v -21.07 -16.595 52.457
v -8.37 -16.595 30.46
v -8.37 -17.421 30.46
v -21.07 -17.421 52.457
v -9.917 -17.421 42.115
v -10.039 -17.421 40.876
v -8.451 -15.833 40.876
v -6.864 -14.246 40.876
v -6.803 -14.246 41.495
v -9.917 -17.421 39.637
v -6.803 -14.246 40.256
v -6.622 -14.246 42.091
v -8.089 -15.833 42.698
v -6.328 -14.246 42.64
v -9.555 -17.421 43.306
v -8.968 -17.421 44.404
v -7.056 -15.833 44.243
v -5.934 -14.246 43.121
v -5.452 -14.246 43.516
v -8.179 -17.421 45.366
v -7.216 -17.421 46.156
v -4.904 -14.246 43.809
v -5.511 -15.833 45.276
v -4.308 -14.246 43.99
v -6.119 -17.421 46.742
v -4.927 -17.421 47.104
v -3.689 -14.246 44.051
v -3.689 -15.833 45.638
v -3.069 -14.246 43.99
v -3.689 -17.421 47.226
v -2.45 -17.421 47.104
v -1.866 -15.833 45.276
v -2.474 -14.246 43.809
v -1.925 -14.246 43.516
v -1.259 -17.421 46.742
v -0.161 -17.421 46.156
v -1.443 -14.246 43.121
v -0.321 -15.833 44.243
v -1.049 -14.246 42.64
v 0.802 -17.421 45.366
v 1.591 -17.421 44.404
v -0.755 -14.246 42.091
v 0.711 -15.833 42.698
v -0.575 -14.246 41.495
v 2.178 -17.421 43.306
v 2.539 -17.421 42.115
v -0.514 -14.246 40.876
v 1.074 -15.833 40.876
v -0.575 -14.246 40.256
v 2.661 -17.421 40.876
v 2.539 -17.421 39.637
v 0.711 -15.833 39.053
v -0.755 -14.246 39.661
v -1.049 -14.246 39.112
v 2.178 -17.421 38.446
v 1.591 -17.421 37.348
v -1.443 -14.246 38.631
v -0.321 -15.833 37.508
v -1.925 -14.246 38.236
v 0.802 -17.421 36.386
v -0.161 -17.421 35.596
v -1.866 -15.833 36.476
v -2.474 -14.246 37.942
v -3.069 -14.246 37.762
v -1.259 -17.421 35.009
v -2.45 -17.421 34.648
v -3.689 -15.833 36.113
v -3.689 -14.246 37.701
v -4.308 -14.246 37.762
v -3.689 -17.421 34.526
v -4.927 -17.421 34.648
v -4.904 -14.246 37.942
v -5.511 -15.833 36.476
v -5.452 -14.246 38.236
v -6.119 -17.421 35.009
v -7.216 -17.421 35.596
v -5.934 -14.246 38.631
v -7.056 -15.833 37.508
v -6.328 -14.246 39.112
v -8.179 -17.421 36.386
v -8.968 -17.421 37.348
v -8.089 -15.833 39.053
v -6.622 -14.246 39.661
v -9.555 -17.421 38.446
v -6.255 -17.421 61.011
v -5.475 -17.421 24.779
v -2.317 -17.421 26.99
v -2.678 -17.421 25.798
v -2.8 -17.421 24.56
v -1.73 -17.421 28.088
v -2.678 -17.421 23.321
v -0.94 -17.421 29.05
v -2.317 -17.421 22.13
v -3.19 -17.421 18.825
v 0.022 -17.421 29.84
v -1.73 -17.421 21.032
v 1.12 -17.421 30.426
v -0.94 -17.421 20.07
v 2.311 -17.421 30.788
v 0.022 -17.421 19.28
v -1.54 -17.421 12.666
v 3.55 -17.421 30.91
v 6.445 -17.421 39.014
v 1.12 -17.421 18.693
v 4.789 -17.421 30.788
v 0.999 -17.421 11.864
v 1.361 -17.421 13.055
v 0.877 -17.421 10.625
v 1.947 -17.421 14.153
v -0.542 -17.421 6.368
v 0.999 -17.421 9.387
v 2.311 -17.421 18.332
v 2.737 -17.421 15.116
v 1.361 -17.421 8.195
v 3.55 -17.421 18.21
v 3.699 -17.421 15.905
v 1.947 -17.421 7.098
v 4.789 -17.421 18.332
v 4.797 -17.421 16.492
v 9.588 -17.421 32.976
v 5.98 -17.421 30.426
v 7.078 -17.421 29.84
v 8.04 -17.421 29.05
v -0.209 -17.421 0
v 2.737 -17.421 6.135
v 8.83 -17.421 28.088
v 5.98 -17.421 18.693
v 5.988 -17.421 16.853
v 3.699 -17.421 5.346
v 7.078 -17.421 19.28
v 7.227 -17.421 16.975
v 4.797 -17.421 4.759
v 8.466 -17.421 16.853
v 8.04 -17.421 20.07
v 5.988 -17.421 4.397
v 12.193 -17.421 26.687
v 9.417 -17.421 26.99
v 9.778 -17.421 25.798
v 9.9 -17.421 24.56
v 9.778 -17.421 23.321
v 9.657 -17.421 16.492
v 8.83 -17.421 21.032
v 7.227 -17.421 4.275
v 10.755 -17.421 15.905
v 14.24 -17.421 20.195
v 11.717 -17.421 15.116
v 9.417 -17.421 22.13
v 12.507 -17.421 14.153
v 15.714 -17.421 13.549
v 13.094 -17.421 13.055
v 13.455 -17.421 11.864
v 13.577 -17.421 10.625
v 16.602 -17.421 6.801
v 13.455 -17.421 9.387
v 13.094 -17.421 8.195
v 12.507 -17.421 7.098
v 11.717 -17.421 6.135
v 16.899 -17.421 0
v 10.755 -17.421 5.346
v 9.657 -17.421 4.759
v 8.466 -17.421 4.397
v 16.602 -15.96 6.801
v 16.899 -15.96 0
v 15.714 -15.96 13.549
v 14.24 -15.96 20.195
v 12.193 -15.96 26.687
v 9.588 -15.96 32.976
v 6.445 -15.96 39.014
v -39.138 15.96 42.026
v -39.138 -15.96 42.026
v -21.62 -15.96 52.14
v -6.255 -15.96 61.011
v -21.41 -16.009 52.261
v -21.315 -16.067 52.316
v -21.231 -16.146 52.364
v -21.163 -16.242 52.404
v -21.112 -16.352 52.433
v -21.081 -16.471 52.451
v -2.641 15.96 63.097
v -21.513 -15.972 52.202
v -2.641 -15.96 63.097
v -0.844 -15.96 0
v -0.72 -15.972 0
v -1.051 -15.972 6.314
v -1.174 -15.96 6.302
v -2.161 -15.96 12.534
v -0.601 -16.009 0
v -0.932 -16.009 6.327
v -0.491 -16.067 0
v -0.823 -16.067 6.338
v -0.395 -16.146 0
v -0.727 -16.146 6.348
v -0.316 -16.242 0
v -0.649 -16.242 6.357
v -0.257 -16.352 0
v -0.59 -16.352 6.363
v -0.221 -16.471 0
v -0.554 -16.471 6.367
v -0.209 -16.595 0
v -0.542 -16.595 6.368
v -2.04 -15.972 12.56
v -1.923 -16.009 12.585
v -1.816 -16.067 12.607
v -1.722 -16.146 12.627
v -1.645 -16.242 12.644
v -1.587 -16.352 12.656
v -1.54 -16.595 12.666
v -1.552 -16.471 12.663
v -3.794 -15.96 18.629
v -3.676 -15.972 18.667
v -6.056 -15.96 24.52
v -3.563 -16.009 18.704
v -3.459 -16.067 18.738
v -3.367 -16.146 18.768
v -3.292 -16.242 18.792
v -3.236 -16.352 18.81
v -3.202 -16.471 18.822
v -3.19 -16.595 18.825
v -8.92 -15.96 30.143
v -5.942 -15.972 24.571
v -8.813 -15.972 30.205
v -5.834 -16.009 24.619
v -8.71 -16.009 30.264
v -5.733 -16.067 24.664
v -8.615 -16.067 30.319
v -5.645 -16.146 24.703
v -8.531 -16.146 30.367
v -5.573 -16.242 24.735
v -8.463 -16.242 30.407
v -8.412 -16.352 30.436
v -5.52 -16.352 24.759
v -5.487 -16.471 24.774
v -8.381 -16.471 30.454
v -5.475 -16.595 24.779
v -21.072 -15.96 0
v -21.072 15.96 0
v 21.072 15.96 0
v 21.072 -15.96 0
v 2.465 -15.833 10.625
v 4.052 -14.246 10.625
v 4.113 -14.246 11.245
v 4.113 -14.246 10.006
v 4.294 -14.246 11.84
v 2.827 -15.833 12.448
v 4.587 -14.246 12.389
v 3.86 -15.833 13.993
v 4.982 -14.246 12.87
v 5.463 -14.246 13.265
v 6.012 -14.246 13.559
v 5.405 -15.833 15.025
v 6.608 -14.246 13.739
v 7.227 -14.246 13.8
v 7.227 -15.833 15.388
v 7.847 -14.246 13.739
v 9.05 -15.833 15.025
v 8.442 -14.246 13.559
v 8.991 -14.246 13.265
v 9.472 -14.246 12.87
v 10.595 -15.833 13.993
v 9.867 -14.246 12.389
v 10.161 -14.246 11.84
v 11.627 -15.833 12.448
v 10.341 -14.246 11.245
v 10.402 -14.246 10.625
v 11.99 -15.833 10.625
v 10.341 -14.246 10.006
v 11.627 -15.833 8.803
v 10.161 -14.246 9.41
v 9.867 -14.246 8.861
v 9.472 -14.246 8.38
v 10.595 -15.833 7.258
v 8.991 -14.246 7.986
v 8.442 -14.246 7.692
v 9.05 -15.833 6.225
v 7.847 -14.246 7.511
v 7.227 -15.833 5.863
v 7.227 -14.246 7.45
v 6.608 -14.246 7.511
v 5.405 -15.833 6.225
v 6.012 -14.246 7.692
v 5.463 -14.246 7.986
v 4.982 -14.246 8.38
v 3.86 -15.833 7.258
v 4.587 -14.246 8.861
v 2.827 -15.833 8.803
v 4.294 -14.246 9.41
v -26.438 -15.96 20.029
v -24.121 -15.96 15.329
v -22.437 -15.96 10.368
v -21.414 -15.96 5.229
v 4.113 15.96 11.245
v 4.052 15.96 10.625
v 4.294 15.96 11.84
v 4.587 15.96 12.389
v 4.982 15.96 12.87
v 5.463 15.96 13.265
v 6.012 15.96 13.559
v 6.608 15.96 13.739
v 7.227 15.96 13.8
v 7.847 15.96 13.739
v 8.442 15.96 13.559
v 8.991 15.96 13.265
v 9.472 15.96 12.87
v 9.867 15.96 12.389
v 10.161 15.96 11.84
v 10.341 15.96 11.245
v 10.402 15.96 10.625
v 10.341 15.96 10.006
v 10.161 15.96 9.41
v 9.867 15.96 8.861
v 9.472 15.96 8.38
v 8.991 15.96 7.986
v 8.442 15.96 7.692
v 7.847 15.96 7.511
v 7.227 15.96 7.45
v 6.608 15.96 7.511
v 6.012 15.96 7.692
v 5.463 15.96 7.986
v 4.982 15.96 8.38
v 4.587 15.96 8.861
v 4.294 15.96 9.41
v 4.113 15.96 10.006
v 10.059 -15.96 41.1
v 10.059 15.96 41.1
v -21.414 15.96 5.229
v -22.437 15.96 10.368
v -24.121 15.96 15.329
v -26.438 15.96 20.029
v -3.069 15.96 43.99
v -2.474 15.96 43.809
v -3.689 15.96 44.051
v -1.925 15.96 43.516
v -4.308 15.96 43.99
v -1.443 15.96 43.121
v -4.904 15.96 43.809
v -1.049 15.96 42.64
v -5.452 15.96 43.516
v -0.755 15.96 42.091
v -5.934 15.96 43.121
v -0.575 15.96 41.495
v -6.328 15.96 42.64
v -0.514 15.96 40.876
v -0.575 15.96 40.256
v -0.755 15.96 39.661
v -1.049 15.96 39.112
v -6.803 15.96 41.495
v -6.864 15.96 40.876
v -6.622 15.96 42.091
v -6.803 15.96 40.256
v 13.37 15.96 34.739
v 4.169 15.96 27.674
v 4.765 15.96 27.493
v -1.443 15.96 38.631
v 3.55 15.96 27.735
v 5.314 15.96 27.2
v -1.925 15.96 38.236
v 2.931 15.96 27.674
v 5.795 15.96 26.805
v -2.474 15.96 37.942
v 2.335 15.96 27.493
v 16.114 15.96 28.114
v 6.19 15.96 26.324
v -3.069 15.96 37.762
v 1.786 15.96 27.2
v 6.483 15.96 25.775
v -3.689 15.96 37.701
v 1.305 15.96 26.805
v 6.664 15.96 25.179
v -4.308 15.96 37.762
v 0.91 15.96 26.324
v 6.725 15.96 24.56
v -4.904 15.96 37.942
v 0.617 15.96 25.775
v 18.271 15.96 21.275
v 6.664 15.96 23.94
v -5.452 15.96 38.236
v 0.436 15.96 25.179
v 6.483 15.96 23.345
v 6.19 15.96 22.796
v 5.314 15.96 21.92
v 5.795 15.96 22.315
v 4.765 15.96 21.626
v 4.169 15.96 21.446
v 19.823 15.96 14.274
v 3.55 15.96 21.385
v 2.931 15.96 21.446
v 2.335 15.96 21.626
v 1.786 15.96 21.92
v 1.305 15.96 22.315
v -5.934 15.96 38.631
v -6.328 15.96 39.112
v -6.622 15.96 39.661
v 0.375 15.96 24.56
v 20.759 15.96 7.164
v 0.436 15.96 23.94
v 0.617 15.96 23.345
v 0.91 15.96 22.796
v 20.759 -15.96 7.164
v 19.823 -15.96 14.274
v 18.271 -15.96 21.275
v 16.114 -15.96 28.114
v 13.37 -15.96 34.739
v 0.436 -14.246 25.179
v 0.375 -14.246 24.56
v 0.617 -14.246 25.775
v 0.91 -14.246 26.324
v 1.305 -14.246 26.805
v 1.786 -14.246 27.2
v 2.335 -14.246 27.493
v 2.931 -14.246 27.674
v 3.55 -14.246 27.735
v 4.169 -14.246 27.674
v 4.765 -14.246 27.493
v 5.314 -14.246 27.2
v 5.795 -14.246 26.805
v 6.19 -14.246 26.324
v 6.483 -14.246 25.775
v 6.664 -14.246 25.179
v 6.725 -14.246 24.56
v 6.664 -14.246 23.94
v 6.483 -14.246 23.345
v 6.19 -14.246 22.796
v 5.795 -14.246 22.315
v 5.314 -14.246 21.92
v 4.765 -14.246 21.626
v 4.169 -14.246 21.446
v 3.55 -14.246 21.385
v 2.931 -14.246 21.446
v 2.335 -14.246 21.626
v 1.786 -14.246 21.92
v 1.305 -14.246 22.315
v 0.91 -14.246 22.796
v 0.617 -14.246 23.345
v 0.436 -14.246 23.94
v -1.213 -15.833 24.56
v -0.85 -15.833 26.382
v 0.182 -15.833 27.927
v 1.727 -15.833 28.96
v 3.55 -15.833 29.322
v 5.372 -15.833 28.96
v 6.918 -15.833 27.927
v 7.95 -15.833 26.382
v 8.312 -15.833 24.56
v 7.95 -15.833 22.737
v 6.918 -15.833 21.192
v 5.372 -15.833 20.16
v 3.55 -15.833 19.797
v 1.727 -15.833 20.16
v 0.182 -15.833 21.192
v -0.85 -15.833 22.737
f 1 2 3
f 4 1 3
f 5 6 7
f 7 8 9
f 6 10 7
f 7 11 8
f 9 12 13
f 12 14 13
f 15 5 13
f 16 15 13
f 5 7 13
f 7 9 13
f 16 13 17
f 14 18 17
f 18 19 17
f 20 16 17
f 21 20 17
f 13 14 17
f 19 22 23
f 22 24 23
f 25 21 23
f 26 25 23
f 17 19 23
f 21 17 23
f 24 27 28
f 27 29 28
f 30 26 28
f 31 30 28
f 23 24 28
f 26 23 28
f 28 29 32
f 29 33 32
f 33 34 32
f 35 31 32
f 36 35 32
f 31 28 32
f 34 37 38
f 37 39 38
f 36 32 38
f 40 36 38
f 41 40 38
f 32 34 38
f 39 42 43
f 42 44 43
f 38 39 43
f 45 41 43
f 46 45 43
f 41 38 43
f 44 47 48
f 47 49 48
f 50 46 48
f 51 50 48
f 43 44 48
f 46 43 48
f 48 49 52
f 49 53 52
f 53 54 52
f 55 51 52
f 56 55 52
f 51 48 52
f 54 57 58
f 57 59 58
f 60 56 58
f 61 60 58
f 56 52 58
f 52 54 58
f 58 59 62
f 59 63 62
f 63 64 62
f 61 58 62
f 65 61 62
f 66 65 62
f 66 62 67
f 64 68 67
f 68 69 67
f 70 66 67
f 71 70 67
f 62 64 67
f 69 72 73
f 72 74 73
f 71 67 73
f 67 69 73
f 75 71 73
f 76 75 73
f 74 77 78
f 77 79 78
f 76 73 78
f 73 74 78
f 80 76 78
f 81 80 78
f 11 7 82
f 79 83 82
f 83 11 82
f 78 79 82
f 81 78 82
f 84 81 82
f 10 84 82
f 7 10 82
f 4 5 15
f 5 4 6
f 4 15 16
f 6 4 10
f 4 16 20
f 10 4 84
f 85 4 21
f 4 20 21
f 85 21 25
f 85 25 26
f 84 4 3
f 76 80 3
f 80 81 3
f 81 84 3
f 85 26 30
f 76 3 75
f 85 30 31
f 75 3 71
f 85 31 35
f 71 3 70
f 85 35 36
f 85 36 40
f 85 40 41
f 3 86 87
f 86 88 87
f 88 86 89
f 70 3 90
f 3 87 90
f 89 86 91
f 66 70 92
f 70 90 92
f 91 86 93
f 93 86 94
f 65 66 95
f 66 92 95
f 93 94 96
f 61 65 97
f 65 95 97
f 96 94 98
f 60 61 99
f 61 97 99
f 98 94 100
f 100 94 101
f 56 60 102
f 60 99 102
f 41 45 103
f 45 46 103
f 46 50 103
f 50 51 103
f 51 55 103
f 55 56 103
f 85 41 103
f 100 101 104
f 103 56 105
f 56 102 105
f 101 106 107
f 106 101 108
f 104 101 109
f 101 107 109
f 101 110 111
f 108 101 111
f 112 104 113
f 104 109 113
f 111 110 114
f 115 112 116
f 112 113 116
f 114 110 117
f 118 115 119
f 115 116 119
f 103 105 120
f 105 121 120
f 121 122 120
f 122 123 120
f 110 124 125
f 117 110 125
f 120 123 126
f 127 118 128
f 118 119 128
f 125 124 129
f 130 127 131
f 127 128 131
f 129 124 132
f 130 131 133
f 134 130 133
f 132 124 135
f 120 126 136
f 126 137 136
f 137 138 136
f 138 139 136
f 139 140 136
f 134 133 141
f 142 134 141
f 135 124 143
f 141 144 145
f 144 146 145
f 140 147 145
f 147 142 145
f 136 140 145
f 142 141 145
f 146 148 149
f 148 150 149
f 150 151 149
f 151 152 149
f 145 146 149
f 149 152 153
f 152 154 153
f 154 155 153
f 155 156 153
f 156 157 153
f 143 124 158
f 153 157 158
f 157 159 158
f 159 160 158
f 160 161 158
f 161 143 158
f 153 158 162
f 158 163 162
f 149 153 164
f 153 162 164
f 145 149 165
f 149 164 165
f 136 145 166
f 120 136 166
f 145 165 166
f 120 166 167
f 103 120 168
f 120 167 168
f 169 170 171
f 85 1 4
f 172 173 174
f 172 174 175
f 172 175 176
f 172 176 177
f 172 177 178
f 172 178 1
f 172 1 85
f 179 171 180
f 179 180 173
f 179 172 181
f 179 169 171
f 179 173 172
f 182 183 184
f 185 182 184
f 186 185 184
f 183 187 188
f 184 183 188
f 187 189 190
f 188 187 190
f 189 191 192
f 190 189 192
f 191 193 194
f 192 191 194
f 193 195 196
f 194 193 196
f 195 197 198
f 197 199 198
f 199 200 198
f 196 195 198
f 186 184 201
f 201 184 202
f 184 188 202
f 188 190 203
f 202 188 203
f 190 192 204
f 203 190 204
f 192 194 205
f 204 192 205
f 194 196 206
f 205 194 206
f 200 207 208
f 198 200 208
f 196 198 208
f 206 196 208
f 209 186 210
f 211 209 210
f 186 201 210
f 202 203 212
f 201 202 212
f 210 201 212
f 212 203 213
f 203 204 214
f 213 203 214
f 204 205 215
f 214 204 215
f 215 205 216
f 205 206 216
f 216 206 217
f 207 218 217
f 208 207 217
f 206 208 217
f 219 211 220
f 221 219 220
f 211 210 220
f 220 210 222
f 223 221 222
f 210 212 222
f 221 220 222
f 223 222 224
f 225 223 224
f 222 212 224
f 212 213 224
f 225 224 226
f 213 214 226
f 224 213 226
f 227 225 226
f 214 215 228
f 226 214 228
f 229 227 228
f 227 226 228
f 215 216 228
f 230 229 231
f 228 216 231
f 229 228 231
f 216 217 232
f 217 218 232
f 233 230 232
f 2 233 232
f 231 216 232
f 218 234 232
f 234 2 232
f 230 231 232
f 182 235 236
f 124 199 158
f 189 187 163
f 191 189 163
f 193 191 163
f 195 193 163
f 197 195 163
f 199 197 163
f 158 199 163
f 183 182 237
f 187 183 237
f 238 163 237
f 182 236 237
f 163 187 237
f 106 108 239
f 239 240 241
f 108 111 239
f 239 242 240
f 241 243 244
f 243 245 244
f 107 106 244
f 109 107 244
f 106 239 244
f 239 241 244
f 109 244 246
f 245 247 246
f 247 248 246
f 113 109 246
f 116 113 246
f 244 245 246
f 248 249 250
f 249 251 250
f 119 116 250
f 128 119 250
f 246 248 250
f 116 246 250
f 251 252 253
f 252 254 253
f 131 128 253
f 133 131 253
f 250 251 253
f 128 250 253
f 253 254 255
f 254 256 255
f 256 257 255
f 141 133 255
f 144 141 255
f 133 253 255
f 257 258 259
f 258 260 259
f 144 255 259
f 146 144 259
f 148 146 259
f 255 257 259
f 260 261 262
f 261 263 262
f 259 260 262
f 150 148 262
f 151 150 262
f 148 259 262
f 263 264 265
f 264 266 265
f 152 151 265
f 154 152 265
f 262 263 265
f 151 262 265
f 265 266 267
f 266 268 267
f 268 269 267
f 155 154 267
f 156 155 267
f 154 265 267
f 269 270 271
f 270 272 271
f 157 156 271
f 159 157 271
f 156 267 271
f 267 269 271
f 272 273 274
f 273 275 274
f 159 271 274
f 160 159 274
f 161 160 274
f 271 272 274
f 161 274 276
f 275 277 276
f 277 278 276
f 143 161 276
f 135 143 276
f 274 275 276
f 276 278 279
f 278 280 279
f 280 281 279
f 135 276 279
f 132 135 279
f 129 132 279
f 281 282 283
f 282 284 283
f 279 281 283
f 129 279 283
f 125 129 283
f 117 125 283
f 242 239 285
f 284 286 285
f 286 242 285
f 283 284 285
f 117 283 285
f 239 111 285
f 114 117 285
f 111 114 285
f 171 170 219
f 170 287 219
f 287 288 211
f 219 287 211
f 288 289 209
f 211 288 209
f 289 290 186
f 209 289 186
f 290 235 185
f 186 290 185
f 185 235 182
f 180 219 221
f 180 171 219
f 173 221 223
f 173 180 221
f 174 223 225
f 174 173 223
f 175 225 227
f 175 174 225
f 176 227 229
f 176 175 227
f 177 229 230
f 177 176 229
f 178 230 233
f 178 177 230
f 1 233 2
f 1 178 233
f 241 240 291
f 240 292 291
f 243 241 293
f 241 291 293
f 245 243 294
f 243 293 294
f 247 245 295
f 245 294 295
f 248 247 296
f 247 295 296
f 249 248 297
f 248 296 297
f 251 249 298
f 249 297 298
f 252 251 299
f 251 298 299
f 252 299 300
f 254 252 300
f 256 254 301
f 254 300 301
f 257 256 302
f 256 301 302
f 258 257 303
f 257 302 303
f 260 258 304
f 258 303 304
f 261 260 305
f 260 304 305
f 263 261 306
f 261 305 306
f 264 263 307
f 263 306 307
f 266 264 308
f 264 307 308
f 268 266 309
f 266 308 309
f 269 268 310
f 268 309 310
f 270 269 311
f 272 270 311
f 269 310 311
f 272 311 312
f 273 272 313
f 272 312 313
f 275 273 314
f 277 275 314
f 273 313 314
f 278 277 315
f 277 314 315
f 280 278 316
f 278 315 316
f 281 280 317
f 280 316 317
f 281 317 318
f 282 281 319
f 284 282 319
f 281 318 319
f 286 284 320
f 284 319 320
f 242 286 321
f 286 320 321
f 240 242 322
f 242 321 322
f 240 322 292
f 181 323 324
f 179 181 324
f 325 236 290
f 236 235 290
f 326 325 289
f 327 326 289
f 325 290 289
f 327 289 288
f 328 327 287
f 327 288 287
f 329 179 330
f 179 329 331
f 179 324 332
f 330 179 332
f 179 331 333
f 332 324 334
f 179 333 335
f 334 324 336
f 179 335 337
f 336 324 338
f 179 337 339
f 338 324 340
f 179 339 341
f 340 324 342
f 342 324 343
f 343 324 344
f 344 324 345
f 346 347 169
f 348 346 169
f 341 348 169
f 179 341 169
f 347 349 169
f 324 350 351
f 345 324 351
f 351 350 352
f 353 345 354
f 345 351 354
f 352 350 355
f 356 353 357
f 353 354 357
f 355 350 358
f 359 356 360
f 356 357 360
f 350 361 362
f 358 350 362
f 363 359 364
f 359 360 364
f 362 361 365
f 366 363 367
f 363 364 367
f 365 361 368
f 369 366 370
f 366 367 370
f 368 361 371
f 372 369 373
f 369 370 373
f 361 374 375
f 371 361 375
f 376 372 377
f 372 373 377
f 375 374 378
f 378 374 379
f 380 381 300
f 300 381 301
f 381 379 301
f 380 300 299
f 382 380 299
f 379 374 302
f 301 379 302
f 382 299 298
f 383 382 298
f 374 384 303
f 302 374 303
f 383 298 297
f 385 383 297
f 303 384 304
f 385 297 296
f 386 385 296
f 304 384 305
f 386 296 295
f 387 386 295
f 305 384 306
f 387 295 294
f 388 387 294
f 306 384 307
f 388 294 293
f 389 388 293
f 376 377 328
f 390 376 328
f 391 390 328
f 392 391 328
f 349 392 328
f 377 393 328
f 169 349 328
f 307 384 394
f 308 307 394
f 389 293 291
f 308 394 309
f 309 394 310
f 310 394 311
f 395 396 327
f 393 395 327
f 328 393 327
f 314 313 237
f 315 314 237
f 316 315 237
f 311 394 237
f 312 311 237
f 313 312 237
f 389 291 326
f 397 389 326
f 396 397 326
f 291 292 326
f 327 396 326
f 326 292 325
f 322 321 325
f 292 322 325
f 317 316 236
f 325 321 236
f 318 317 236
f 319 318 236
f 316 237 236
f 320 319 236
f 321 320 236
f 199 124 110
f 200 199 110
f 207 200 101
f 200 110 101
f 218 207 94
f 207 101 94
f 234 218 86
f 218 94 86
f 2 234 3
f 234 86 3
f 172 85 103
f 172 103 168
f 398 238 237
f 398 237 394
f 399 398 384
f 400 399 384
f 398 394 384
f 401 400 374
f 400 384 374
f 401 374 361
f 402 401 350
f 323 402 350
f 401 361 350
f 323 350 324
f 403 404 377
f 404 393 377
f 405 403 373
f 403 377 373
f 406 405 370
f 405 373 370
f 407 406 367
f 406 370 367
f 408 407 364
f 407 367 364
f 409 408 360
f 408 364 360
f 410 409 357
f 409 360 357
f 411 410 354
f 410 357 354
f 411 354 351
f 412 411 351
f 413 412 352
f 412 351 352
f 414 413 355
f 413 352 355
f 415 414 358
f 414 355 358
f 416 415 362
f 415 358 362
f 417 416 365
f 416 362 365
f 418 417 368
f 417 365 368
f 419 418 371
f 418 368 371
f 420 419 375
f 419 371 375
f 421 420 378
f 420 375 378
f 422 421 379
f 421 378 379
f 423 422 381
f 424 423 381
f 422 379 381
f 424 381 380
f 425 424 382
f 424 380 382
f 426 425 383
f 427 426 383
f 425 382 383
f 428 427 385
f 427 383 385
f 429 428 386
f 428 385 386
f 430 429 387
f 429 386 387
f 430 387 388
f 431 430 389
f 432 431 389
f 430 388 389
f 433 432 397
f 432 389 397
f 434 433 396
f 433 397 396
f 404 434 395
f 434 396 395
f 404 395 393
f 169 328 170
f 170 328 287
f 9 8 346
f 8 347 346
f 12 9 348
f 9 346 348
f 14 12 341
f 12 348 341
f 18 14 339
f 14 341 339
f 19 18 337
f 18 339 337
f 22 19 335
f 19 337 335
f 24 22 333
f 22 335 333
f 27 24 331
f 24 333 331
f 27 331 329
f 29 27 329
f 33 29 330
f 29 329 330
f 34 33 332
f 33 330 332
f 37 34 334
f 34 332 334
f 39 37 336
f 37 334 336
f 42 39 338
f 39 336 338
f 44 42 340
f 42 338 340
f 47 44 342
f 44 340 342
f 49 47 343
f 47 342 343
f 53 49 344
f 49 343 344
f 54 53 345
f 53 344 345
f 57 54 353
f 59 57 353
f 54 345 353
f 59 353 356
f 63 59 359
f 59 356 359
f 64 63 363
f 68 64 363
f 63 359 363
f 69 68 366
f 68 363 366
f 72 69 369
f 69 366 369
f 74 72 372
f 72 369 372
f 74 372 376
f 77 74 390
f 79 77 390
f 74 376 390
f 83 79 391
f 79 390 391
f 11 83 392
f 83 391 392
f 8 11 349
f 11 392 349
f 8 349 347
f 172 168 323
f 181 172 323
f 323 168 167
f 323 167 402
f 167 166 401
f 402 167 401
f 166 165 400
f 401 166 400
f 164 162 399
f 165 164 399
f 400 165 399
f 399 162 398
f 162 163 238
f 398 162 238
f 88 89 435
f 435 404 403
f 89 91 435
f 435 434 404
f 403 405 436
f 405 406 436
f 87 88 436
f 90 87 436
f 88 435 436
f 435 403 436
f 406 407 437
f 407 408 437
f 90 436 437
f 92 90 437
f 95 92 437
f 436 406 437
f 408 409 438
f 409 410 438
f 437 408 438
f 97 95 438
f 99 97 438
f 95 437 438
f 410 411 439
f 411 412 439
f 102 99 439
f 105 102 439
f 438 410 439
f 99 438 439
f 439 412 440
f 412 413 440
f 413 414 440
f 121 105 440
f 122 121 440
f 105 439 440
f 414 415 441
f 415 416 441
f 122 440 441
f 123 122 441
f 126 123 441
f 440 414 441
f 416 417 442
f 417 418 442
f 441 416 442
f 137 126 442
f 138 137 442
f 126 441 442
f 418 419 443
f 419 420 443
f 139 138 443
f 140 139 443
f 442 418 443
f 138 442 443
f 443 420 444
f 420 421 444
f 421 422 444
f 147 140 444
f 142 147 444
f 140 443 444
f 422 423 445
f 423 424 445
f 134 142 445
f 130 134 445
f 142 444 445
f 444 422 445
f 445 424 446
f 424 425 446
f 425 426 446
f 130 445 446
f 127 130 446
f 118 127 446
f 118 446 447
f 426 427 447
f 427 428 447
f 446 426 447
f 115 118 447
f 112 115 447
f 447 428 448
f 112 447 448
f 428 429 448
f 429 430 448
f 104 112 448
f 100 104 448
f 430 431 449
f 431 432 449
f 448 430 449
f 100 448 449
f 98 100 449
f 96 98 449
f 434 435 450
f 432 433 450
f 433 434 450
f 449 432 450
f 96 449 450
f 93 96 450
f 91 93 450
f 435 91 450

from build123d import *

# Parameters (mm, degrees)
F2_ANGLE       = 30
F3_DEPTH       = 25.4
F4_R           = 0.635
F6_D           = 6.35
F6_CSINK_D     = 12.7
F6_CSINK_ANGLE = 90


with BuildPart() as f2:
    # F0 (on Top) → F2 (revolve)
    with BuildSketch(Plane.XY):
        Polygon((21.0717357695, -15.9602742642), (21.0717357695, 15.9602742642), (-21.0717357695, 15.9602742642), (-21.0717357695, -15.9602742642), (-0.2086274326, -15.9602742642), (-0.2086274326, -17.420691438), (16.899112612, -17.420691438), (16.899112612, -15.9602742642), align=None)
    revolve(axis=Axis((-61.1288920045, 1.6690483317, 0), (0, -1, 0)), revolution_arc=F2_ANGLE)

    # F3 (add): a face of the model
    f3_faces = [f2.faces().sort_by_distance(p)[0] for p in [
        (-8.057939505, -0.3043307955, 30.6405287117),
    ]]
    extrude(f3_faces, amount=F3_DEPTH)

    # F4
    f4_edges = [f2.edges().sort_by_distance(p)[0] for p in [
        (-2.284435, -15.960274, 15.767325),
        (-14.720395, -15.960274, 41.458655),
    ]]
    fillet(f4_edges, radius=F4_R)

    # F6 (through all)
    with Locations(Plane.XZ.offset(17.420691438)):
        with Locations((7.227263879, 10.6254266575), (3.5499625374, 24.5596691966), (-3.6885414738, 40.8757403493)):
            CounterSinkHole(F6_D / 2, F6_CSINK_D / 2, counter_sink_angle=F6_CSINK_ANGLE)


solid = f2.part
